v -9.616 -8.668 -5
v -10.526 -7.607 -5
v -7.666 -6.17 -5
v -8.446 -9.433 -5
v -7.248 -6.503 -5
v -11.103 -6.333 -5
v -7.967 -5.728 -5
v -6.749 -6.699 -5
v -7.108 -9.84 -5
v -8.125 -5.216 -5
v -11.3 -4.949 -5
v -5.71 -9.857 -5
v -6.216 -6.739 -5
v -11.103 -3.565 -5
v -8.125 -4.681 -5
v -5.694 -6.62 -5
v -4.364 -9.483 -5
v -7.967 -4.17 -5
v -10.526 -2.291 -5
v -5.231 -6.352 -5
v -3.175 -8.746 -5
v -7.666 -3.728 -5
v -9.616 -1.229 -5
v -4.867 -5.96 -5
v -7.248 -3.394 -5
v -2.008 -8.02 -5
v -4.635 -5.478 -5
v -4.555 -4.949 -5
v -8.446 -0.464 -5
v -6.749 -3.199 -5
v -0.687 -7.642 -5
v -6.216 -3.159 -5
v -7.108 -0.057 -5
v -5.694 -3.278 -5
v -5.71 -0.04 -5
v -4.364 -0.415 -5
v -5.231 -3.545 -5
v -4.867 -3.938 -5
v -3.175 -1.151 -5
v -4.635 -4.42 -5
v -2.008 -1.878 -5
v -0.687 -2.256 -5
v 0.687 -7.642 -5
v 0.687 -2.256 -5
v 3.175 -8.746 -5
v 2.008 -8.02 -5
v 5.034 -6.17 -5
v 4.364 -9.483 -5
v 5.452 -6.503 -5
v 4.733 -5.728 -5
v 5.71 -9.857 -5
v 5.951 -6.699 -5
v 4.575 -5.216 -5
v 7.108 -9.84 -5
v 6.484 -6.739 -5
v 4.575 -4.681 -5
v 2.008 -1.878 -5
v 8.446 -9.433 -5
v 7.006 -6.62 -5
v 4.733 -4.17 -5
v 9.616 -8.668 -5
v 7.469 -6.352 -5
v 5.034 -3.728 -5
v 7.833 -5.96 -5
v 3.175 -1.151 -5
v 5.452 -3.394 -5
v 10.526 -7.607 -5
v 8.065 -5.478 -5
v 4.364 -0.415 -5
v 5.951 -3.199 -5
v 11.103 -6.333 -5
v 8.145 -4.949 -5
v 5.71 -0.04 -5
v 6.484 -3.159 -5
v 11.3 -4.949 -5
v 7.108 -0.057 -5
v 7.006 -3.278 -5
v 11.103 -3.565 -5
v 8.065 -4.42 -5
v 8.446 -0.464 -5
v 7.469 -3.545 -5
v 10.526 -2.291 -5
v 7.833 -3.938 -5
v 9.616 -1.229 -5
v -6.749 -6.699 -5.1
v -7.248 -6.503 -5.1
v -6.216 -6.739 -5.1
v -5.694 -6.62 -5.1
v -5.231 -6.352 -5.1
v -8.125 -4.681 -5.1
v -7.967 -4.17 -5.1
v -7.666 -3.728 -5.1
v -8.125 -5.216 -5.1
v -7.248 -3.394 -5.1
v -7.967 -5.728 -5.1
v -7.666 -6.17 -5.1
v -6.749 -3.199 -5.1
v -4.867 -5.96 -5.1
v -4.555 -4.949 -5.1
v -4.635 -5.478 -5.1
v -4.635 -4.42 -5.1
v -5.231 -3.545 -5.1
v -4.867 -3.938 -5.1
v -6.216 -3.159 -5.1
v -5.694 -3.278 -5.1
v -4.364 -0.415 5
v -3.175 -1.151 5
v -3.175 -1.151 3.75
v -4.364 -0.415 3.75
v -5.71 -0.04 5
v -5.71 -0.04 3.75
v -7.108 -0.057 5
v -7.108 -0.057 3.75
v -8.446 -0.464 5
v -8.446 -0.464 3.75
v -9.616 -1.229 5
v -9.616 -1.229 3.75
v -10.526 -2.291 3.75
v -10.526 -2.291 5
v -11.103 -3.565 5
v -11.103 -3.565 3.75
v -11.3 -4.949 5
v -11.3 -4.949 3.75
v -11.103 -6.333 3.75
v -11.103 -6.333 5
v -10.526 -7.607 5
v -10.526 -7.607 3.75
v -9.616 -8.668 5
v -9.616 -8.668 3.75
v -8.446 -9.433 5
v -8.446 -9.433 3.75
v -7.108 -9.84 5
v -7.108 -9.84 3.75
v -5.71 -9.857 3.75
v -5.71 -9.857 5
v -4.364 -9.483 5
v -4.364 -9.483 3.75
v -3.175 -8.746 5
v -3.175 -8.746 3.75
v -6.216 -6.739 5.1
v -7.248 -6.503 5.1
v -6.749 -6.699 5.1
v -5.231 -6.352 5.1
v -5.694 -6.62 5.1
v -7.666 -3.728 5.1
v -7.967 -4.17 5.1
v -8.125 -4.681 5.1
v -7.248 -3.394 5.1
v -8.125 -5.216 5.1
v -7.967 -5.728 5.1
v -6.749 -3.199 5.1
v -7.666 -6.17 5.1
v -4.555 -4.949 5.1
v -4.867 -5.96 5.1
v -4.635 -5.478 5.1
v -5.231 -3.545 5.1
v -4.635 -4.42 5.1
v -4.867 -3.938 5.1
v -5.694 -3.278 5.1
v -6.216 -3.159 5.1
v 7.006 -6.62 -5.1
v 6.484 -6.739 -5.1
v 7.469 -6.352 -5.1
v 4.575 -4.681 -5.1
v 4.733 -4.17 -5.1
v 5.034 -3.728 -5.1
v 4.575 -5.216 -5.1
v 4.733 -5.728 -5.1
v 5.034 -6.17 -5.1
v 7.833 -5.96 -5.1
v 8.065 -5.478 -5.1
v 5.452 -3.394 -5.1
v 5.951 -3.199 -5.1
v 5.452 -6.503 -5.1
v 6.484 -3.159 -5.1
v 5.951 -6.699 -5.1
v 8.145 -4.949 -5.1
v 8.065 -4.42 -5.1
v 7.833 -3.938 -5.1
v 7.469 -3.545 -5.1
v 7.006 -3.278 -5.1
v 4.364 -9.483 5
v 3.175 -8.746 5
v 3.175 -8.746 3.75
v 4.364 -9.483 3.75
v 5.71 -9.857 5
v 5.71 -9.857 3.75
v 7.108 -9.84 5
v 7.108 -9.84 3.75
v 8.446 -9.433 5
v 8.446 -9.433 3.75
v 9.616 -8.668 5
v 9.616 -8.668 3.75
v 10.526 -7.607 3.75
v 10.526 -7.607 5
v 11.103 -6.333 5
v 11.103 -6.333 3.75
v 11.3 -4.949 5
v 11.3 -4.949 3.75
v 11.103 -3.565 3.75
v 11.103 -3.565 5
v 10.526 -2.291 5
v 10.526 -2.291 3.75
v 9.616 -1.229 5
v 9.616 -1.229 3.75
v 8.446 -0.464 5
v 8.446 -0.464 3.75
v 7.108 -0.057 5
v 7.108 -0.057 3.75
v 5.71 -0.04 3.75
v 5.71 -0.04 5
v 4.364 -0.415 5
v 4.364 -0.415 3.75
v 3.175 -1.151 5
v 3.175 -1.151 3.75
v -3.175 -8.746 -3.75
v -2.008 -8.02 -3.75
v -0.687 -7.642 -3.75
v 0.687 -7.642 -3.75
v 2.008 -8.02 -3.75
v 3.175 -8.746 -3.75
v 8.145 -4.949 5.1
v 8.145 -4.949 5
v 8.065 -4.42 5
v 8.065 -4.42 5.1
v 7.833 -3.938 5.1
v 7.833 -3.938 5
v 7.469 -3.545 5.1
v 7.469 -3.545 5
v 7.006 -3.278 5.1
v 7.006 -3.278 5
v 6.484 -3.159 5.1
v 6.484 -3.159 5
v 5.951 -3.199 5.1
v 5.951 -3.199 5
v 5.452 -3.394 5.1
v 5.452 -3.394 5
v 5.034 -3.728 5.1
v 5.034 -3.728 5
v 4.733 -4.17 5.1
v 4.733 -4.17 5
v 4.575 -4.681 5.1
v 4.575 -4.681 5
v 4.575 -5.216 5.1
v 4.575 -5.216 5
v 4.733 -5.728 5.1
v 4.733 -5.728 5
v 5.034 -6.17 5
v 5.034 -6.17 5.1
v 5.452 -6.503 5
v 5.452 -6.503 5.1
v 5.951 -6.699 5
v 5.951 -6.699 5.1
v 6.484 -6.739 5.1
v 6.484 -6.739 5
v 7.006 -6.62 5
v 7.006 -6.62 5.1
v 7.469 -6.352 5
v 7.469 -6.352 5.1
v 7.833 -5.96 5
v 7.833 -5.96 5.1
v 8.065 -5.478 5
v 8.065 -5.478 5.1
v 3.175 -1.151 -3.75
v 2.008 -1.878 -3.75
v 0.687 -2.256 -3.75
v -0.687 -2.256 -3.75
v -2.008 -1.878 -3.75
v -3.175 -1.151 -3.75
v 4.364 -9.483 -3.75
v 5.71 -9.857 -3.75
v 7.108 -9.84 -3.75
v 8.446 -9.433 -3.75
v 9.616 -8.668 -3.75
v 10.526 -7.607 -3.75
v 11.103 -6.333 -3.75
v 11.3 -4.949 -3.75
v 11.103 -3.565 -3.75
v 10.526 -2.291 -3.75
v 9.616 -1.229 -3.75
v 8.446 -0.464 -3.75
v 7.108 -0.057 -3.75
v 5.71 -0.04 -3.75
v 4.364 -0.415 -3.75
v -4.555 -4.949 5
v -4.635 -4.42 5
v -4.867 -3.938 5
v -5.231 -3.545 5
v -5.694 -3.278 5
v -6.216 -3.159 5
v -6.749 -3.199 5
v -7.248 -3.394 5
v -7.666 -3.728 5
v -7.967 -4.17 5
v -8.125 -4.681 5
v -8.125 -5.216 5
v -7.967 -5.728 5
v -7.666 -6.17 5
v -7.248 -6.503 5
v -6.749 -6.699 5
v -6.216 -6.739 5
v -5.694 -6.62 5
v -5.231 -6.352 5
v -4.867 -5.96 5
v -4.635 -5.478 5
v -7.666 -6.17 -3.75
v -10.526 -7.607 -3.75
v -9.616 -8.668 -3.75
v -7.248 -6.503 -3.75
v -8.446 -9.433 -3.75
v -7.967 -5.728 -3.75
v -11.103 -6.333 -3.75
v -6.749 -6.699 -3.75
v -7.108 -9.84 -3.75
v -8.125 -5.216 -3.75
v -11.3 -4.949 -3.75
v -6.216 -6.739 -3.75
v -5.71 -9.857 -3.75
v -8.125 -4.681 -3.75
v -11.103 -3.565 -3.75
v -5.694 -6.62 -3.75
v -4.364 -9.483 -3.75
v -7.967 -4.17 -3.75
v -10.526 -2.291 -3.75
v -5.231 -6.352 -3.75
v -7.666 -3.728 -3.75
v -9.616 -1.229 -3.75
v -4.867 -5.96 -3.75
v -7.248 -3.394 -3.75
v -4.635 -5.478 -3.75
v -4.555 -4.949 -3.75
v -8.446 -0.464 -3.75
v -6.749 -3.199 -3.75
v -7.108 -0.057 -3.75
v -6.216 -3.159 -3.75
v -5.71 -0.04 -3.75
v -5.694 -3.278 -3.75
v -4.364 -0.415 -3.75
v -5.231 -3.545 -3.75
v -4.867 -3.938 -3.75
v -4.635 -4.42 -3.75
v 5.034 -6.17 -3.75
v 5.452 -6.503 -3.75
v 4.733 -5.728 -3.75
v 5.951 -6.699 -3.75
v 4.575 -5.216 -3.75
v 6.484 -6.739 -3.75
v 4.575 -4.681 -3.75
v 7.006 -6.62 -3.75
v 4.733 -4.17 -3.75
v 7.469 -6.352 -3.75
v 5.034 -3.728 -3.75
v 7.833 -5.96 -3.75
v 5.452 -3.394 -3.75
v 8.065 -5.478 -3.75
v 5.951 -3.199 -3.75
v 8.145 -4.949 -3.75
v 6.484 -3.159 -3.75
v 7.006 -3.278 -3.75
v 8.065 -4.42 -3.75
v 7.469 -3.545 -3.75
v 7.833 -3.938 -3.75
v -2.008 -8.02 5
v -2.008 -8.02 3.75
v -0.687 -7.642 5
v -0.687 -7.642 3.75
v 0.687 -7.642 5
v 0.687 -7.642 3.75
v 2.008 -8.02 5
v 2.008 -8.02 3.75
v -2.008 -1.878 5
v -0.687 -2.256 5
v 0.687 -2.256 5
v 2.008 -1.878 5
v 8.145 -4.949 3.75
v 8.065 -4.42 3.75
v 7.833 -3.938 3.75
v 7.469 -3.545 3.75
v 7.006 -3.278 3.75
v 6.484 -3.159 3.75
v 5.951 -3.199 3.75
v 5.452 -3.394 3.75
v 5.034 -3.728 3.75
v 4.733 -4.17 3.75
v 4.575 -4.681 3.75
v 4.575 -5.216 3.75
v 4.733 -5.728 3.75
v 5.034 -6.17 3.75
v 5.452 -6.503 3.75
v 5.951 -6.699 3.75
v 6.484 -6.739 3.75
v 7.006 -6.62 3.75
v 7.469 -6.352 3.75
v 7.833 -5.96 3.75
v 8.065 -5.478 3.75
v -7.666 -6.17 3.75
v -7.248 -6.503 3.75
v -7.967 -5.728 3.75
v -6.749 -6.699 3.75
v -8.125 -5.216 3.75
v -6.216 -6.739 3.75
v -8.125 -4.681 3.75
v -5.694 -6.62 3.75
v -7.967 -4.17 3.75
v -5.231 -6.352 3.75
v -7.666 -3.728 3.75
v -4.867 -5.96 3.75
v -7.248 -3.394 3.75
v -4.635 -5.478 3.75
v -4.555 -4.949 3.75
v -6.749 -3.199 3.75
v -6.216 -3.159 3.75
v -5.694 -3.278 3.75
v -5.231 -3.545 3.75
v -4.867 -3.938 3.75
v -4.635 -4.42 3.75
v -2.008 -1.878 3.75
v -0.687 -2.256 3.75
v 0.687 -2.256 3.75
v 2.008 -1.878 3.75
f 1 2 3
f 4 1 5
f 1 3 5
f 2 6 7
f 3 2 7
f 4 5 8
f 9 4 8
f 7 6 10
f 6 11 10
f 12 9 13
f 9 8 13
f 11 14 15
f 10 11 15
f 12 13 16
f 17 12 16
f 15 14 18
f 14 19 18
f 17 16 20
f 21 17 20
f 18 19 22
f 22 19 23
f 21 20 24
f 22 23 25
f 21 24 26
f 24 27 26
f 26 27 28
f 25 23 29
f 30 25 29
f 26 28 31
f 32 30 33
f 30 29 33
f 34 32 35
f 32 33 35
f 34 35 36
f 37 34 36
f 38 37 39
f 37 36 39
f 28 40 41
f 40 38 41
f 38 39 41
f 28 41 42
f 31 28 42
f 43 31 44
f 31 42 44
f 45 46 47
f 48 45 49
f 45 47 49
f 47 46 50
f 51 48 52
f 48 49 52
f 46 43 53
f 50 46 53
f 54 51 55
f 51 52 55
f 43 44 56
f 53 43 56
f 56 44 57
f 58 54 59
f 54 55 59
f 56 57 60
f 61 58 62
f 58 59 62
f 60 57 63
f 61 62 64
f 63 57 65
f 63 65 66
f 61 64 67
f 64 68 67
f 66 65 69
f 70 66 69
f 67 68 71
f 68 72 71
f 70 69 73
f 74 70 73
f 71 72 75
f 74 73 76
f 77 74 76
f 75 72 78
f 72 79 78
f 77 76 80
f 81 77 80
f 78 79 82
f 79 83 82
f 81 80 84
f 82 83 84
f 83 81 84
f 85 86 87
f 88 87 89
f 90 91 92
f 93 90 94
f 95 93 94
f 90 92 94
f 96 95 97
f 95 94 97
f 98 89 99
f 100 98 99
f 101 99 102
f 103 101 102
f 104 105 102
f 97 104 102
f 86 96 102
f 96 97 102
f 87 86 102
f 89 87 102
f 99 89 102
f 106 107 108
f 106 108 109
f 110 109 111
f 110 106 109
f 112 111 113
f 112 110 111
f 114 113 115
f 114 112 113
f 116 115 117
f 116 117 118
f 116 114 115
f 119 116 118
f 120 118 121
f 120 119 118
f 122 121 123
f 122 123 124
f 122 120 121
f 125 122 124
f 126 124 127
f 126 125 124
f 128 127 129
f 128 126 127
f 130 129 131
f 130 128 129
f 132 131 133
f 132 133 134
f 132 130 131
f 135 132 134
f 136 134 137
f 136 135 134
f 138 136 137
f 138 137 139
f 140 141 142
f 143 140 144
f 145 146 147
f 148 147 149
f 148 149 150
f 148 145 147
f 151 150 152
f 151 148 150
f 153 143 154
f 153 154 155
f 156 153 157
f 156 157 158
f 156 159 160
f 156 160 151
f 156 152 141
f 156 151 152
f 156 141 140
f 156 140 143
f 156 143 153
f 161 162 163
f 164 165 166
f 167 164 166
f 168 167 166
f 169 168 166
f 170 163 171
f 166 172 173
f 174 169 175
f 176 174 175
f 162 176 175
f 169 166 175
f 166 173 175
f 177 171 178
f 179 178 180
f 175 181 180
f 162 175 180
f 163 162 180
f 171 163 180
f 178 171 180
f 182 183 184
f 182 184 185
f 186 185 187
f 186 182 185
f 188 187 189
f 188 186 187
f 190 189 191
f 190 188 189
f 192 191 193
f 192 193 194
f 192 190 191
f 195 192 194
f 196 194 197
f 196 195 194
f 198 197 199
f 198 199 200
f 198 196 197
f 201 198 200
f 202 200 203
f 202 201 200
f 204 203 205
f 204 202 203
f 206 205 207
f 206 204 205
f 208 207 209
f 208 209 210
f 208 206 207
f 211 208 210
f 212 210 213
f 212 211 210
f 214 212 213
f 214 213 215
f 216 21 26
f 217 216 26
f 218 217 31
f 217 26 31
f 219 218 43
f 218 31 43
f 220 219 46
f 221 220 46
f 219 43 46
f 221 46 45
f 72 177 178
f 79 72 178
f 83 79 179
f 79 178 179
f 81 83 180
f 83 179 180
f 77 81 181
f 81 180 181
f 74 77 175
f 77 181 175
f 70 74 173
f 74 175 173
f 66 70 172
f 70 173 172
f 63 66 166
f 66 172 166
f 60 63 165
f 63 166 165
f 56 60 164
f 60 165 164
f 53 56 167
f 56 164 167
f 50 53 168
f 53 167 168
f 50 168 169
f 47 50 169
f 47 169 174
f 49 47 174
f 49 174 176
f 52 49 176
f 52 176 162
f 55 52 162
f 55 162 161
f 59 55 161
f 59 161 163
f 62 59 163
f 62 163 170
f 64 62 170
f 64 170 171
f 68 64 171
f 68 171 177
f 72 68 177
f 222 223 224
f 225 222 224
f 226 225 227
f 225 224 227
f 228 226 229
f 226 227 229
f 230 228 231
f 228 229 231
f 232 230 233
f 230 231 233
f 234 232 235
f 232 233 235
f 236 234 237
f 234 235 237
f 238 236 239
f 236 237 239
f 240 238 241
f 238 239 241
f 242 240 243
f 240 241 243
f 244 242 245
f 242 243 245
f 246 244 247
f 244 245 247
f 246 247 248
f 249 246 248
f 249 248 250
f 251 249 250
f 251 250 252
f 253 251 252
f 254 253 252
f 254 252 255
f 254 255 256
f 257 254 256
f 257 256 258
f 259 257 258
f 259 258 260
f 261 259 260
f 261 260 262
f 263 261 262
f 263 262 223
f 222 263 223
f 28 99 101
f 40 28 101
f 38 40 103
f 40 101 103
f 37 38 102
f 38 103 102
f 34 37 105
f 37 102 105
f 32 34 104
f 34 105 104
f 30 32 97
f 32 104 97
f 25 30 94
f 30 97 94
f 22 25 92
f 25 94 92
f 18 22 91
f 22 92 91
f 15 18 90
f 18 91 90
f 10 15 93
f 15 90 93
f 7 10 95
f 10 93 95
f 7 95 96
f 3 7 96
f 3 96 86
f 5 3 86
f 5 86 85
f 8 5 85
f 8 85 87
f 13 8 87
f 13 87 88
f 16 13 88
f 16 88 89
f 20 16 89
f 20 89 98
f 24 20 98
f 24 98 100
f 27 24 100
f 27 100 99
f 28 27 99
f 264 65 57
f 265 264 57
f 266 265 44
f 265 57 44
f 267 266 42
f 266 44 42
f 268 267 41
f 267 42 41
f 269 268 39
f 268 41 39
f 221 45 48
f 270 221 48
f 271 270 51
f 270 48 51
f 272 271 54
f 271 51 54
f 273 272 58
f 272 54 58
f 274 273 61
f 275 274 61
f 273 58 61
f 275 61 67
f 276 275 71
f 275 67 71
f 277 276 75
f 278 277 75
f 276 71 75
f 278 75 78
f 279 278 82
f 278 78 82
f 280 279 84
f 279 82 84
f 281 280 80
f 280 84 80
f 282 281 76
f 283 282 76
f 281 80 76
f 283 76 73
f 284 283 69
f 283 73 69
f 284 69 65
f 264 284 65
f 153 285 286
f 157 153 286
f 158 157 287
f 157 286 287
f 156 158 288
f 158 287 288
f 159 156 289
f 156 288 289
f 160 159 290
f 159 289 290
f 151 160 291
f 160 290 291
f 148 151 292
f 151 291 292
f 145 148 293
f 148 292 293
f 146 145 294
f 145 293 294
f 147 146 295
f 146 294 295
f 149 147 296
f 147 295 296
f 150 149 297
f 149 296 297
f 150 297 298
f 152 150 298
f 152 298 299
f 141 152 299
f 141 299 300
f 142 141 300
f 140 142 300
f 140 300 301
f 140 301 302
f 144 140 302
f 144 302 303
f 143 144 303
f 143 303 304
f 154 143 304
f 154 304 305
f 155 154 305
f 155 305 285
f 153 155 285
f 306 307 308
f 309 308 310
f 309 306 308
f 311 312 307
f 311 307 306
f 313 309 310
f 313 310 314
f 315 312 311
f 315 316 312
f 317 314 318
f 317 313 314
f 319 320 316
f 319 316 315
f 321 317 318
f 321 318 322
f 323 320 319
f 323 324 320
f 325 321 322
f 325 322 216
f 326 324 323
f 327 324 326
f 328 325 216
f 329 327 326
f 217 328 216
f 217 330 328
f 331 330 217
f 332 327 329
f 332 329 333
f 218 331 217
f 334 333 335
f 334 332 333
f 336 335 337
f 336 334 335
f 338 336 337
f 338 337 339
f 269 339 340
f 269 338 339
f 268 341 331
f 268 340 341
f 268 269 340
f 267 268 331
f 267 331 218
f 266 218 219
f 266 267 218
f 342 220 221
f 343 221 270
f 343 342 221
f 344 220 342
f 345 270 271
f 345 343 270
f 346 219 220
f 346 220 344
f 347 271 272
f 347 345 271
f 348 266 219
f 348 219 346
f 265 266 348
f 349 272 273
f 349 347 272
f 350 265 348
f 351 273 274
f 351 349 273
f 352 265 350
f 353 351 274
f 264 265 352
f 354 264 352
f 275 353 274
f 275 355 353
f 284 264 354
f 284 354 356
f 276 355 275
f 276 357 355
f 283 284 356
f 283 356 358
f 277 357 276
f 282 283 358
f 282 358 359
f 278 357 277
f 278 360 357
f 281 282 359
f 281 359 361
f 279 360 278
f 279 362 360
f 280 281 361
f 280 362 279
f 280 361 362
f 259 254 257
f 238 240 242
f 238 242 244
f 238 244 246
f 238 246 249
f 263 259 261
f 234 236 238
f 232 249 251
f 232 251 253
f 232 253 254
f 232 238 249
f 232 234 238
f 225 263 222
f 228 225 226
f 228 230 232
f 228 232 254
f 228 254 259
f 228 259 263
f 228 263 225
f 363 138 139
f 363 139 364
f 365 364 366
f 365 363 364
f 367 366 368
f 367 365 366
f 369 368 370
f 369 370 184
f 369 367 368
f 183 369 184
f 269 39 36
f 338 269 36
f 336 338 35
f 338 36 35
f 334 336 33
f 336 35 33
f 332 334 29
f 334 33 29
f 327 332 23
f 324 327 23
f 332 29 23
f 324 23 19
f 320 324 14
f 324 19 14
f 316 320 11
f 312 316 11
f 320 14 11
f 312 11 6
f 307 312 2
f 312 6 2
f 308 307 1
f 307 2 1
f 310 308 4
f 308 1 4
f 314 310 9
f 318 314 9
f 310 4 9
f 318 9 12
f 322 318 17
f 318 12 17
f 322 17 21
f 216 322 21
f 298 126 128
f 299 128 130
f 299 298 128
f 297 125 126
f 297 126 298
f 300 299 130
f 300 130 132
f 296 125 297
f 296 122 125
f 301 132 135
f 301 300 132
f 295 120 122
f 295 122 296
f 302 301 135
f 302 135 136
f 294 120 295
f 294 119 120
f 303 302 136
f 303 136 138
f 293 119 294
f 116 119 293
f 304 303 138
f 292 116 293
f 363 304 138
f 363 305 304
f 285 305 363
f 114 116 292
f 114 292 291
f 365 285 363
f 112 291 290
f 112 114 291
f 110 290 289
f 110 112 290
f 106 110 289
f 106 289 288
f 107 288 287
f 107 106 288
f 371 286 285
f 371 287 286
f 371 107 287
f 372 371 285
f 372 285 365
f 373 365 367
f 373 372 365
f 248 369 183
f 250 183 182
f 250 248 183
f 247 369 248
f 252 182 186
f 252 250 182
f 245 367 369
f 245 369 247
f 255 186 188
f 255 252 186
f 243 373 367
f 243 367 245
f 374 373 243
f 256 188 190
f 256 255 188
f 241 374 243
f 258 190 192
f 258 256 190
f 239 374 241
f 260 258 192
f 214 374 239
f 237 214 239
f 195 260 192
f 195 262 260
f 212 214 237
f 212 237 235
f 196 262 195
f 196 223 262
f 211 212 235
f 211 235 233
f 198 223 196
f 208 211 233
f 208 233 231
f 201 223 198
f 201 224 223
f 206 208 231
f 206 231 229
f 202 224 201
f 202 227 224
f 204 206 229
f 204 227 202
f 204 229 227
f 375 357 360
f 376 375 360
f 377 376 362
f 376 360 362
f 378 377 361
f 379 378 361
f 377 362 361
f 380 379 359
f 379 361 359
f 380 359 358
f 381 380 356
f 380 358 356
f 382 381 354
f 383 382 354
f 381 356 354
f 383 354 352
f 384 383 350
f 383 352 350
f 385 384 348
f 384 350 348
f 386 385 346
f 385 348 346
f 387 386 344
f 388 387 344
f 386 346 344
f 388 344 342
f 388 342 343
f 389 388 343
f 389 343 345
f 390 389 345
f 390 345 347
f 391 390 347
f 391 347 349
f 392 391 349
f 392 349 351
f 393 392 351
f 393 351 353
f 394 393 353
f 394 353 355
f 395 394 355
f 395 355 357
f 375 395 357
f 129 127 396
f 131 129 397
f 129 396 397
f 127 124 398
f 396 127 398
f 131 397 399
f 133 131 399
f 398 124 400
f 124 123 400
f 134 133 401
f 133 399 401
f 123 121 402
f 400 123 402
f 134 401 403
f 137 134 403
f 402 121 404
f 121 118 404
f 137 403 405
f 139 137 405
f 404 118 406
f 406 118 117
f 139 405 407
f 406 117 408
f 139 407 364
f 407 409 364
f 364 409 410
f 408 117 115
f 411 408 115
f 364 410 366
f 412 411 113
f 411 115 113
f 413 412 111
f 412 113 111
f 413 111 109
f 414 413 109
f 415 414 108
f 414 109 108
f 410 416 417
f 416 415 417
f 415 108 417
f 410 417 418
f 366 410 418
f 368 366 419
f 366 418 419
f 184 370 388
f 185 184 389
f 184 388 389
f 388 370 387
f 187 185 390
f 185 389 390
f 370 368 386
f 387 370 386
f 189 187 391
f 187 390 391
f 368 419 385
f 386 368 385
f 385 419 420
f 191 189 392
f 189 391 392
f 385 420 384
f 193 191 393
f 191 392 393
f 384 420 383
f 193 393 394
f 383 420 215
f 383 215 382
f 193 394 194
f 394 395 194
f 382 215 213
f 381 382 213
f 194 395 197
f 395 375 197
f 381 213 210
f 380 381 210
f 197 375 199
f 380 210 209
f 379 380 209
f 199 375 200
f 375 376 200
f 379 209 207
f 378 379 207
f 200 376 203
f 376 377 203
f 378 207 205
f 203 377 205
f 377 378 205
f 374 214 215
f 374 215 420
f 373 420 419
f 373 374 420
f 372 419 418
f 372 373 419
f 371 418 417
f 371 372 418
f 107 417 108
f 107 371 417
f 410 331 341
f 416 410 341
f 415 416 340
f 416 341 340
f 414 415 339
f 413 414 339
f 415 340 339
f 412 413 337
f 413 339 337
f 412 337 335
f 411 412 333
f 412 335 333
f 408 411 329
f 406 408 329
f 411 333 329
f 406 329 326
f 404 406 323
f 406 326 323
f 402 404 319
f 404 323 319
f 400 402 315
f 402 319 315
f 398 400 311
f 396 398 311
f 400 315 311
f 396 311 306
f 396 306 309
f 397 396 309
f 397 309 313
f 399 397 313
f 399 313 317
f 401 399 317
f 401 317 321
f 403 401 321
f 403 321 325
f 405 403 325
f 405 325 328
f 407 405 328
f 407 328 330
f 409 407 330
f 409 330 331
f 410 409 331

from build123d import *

# Parameters (mm, degrees)
SKETCH_2_R           = 1.795
EXTRUDE_1_DEPTH      = 1.25
EXTRUDE_2_DEPTH      = 5.1
EXTRUDE_2_DEPTH_BACK = 5.1
SKETCH_1_R           = 1.795


with BuildPart() as part:
    # Эскиз2 → Бобышка-Вытянуть1 (new body)
    with BuildSketch(Plane.XY.offset(5)):
        with BuildLine():
            ThreePointArc((3.175, -8.746386407), (11.3, -4.948772024), (3.175, -1.151157641))
            ThreePointArc((3.175, -1.151157641), (0, -2.303543258), (-3.175, -1.151157641))
            ThreePointArc((-3.175, -1.151157641), (-11.3, -4.948772024), (-3.175, -8.746386407))
            ThreePointArc((-3.175, -8.746386407), (0, -7.594000789), (3.175, -8.746386407))
        make_face()
        with Locations((6.35, -4.948772024)):
            Circle(SKETCH_2_R, mode=Mode.SUBTRACT)
        with Locations((-6.35, -4.948772024)):
            Circle(SKETCH_2_R, mode=Mode.SUBTRACT)
    extrude(amount=-EXTRUDE_1_DEPTH)


with BuildPart() as body_2:
    # Зеркальное отражение3: mirrored copy
    add(part.part.mirror(Plane.XY))


with BuildPart() as part_1:
    add(part.part)

    add(body_2.part)  # Бобышка-Вытянуть2 merges body 2
    # Эскиз1 → Бобышка-Вытянуть2 (add, two sides: drawn at the far end of the back side and taken through both)
    with BuildSketch(Plane.XY.offset(-EXTRUDE_2_DEPTH_BACK)):
        with Locations((6.35, -4.948772024)):
            Circle(SKETCH_1_R)
        with Locations((-6.35, -4.948772024)):
            Circle(SKETCH_1_R)
    extrude(amount=EXTRUDE_2_DEPTH + EXTRUDE_2_DEPTH_BACK)


solid = part_1.part
